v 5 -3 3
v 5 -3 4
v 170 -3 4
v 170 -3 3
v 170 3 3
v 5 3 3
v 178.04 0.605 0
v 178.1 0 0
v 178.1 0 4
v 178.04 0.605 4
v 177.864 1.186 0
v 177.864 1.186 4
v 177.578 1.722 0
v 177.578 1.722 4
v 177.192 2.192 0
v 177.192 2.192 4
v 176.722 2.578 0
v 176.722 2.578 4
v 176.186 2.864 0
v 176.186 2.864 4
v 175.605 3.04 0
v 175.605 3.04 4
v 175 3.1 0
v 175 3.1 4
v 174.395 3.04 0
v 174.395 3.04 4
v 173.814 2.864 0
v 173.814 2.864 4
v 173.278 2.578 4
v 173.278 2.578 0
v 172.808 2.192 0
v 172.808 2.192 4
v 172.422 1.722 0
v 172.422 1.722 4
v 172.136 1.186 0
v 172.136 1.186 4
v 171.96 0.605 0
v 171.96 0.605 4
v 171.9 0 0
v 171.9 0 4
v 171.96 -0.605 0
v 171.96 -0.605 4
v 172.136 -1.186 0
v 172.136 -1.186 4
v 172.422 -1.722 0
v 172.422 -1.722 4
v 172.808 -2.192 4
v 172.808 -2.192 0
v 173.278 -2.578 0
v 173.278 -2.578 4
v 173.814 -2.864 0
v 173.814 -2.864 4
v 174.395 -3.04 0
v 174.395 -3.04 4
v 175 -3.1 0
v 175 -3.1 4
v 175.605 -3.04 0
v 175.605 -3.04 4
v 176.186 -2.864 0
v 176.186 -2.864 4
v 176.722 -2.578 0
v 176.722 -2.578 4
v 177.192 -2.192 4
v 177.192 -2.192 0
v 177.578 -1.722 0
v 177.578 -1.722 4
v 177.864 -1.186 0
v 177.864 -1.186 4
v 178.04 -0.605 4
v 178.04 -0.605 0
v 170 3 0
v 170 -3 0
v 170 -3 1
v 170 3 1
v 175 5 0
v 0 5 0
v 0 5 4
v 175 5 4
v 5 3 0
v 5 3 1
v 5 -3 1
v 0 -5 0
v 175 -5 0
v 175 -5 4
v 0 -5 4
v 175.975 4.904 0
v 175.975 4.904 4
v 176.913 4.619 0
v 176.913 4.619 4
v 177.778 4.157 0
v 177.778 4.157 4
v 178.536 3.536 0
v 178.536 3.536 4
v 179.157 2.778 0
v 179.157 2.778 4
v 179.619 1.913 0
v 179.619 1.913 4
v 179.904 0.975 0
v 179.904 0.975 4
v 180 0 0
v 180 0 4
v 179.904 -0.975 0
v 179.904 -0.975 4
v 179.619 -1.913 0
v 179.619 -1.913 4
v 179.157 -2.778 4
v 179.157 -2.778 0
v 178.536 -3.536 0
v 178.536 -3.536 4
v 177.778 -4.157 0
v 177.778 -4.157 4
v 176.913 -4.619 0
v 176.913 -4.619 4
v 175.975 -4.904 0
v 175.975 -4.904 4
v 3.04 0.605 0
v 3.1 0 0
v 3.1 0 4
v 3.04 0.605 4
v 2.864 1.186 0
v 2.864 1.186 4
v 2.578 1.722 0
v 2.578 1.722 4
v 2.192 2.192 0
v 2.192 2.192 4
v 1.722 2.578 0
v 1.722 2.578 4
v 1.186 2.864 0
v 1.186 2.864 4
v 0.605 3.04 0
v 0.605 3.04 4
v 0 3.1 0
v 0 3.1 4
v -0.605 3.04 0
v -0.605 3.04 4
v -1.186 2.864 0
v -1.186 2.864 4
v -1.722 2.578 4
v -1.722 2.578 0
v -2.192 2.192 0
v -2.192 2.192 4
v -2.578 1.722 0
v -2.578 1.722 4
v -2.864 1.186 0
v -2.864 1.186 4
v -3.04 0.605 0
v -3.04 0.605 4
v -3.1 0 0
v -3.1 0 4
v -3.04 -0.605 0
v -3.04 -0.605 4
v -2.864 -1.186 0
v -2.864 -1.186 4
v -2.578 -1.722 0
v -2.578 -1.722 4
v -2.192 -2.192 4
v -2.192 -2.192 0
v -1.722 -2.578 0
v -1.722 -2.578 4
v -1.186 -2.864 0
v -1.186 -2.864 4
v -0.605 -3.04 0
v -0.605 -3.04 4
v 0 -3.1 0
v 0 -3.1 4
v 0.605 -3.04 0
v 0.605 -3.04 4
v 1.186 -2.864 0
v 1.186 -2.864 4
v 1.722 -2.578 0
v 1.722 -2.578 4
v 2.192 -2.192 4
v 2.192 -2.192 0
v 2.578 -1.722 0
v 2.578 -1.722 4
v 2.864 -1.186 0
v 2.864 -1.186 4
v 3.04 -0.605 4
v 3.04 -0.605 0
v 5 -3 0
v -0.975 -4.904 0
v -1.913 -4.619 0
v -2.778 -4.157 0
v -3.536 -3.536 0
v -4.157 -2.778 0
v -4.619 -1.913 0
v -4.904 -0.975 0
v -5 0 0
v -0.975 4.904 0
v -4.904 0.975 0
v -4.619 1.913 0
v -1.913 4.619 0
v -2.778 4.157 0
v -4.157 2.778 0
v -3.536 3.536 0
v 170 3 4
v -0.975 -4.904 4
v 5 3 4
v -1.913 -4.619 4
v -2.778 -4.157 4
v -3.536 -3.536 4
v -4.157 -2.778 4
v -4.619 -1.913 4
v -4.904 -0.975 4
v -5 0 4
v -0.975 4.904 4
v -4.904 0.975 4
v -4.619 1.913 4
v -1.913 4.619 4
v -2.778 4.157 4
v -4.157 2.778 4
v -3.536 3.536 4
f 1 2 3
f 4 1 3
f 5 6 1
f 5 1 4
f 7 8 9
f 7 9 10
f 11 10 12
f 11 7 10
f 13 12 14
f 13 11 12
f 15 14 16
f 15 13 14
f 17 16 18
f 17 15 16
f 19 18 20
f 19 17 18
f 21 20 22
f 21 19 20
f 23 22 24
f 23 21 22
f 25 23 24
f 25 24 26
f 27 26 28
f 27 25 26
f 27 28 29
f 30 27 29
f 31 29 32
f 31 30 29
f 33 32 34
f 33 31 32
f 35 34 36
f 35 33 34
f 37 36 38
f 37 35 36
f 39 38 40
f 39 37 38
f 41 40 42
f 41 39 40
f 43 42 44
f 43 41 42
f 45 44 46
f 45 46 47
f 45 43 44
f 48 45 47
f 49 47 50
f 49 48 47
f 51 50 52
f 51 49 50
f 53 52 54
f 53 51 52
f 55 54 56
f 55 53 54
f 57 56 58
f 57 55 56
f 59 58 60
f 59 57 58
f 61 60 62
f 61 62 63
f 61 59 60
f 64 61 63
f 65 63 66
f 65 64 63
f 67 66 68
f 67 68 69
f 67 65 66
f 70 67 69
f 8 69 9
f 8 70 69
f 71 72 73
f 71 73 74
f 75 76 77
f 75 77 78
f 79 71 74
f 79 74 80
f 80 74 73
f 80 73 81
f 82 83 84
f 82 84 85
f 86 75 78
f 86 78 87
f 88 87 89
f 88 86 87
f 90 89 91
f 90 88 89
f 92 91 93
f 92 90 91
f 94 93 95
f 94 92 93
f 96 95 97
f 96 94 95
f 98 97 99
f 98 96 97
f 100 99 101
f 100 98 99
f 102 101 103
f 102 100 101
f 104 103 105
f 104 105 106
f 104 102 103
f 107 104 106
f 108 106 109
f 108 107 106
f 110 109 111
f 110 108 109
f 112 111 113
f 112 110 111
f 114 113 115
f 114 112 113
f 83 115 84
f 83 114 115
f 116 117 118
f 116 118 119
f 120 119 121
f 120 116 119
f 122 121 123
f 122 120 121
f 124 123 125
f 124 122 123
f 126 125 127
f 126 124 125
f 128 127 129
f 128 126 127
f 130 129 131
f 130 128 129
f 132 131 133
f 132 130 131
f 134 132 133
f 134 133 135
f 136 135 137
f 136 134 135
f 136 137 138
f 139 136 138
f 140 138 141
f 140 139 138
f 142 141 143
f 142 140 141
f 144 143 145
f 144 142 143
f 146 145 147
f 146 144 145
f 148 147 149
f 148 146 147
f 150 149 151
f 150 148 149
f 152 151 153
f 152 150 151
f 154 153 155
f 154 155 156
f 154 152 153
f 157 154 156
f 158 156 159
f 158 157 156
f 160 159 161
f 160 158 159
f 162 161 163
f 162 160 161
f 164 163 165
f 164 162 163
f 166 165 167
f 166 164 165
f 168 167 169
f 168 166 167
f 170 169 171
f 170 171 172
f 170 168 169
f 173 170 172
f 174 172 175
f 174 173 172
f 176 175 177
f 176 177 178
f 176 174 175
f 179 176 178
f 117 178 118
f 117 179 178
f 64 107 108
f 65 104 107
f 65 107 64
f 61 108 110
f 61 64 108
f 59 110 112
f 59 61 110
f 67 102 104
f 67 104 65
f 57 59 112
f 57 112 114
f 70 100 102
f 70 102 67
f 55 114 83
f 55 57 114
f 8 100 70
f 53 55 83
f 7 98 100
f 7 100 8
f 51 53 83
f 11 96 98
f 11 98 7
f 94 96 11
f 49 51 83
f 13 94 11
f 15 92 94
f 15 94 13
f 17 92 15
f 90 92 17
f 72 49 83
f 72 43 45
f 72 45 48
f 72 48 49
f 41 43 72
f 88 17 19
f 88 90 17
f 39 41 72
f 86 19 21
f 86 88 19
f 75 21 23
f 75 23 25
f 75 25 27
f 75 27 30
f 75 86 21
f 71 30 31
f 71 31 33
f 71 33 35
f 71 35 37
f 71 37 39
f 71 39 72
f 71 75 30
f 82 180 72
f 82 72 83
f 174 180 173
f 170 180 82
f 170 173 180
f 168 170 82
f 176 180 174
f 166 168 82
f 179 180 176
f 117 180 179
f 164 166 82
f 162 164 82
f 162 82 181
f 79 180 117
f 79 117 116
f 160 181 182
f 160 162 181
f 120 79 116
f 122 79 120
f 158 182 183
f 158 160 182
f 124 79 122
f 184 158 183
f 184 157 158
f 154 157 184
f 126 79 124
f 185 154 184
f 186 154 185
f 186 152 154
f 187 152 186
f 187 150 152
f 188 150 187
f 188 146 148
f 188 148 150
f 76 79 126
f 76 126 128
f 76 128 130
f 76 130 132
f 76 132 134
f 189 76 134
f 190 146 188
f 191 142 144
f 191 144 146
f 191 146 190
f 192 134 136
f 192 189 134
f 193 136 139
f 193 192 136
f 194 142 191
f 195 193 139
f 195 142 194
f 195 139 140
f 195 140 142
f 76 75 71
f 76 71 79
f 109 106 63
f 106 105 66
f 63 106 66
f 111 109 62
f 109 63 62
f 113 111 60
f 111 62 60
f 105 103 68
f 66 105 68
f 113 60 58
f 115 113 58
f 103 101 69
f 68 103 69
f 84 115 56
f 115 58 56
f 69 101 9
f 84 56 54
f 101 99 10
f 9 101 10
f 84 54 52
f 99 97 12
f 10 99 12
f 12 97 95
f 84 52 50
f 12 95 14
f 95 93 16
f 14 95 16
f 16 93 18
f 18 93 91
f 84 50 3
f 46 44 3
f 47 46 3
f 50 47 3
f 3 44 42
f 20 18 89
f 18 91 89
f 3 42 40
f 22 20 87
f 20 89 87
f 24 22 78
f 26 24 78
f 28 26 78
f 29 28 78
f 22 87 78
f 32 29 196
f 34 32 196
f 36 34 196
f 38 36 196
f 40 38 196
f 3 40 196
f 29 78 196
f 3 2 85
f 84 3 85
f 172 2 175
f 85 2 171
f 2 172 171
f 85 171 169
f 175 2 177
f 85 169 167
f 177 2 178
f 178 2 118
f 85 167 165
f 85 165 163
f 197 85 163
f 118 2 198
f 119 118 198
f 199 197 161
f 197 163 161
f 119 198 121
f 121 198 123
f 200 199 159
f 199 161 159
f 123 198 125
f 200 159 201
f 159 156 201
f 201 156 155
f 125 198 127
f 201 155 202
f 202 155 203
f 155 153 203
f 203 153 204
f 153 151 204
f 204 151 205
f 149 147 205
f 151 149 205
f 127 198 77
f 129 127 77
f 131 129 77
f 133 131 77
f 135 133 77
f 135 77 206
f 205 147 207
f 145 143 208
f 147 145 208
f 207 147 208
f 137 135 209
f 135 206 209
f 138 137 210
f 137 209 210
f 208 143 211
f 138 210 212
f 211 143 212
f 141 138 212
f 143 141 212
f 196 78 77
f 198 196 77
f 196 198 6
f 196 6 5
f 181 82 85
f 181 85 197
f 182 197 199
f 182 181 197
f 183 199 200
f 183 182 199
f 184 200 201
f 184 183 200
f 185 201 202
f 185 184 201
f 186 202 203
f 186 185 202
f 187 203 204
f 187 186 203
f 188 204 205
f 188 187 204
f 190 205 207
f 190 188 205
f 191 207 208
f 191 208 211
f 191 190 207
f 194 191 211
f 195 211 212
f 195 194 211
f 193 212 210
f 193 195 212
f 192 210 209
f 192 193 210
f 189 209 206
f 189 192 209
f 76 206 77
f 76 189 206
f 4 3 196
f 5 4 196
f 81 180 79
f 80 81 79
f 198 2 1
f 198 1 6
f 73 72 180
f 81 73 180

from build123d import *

# Parameters (mm, degrees)
CROQUIS1_R              = 3.1
SALIENTE_EXTRUIR1_DEPTH = 4
CROQUIS2_W              = 165
CROQUIS2_H              = 6
CORTAR_EXTRUIR1_DEPTH   = 1
CROQUIS3_W              = 165
CROQUIS3_H              = 6
CORTAR_EXTRUIR2_DEPTH   = 1


with BuildPart() as part:
    # Croquis1 → Saliente-Extruir1 (new body)
    with BuildSketch(Plane.XY):
        with BuildLine():
            Line((0, 5), (175, 5))
            ThreePointArc((175, 5), (180, 0), (175, -5))
            Line((175, -5), (0, -5))
            ThreePointArc((0, -5), (-5, 0), (0, 5))
        make_face()
        Circle(CROQUIS1_R, mode=Mode.SUBTRACT)
        with Locations((175, 0)):
            Circle(CROQUIS1_R, mode=Mode.SUBTRACT)
    extrude(amount=SALIENTE_EXTRUIR1_DEPTH)

    # Croquis2 → Cortar-Extruir1 (cut)
    with BuildSketch(Plane.XY.offset(4)):
        with Locations((87.5, 0)):
            Rectangle(CROQUIS2_W, CROQUIS2_H)
    extrude(amount=-CORTAR_EXTRUIR1_DEPTH, mode=Mode.SUBTRACT)

    # Croquis3 → Cortar-Extruir2 (cut)
    with BuildSketch(Plane(origin=(0, 0, 0), x_dir=(-1, 0, 0), z_dir=(0, 0, -1))):
        with Locations((-87.5, 0)):
            Rectangle(CROQUIS3_W, CROQUIS3_H)
    extrude(amount=-CORTAR_EXTRUIR2_DEPTH, mode=Mode.SUBTRACT)


solid = part.part
